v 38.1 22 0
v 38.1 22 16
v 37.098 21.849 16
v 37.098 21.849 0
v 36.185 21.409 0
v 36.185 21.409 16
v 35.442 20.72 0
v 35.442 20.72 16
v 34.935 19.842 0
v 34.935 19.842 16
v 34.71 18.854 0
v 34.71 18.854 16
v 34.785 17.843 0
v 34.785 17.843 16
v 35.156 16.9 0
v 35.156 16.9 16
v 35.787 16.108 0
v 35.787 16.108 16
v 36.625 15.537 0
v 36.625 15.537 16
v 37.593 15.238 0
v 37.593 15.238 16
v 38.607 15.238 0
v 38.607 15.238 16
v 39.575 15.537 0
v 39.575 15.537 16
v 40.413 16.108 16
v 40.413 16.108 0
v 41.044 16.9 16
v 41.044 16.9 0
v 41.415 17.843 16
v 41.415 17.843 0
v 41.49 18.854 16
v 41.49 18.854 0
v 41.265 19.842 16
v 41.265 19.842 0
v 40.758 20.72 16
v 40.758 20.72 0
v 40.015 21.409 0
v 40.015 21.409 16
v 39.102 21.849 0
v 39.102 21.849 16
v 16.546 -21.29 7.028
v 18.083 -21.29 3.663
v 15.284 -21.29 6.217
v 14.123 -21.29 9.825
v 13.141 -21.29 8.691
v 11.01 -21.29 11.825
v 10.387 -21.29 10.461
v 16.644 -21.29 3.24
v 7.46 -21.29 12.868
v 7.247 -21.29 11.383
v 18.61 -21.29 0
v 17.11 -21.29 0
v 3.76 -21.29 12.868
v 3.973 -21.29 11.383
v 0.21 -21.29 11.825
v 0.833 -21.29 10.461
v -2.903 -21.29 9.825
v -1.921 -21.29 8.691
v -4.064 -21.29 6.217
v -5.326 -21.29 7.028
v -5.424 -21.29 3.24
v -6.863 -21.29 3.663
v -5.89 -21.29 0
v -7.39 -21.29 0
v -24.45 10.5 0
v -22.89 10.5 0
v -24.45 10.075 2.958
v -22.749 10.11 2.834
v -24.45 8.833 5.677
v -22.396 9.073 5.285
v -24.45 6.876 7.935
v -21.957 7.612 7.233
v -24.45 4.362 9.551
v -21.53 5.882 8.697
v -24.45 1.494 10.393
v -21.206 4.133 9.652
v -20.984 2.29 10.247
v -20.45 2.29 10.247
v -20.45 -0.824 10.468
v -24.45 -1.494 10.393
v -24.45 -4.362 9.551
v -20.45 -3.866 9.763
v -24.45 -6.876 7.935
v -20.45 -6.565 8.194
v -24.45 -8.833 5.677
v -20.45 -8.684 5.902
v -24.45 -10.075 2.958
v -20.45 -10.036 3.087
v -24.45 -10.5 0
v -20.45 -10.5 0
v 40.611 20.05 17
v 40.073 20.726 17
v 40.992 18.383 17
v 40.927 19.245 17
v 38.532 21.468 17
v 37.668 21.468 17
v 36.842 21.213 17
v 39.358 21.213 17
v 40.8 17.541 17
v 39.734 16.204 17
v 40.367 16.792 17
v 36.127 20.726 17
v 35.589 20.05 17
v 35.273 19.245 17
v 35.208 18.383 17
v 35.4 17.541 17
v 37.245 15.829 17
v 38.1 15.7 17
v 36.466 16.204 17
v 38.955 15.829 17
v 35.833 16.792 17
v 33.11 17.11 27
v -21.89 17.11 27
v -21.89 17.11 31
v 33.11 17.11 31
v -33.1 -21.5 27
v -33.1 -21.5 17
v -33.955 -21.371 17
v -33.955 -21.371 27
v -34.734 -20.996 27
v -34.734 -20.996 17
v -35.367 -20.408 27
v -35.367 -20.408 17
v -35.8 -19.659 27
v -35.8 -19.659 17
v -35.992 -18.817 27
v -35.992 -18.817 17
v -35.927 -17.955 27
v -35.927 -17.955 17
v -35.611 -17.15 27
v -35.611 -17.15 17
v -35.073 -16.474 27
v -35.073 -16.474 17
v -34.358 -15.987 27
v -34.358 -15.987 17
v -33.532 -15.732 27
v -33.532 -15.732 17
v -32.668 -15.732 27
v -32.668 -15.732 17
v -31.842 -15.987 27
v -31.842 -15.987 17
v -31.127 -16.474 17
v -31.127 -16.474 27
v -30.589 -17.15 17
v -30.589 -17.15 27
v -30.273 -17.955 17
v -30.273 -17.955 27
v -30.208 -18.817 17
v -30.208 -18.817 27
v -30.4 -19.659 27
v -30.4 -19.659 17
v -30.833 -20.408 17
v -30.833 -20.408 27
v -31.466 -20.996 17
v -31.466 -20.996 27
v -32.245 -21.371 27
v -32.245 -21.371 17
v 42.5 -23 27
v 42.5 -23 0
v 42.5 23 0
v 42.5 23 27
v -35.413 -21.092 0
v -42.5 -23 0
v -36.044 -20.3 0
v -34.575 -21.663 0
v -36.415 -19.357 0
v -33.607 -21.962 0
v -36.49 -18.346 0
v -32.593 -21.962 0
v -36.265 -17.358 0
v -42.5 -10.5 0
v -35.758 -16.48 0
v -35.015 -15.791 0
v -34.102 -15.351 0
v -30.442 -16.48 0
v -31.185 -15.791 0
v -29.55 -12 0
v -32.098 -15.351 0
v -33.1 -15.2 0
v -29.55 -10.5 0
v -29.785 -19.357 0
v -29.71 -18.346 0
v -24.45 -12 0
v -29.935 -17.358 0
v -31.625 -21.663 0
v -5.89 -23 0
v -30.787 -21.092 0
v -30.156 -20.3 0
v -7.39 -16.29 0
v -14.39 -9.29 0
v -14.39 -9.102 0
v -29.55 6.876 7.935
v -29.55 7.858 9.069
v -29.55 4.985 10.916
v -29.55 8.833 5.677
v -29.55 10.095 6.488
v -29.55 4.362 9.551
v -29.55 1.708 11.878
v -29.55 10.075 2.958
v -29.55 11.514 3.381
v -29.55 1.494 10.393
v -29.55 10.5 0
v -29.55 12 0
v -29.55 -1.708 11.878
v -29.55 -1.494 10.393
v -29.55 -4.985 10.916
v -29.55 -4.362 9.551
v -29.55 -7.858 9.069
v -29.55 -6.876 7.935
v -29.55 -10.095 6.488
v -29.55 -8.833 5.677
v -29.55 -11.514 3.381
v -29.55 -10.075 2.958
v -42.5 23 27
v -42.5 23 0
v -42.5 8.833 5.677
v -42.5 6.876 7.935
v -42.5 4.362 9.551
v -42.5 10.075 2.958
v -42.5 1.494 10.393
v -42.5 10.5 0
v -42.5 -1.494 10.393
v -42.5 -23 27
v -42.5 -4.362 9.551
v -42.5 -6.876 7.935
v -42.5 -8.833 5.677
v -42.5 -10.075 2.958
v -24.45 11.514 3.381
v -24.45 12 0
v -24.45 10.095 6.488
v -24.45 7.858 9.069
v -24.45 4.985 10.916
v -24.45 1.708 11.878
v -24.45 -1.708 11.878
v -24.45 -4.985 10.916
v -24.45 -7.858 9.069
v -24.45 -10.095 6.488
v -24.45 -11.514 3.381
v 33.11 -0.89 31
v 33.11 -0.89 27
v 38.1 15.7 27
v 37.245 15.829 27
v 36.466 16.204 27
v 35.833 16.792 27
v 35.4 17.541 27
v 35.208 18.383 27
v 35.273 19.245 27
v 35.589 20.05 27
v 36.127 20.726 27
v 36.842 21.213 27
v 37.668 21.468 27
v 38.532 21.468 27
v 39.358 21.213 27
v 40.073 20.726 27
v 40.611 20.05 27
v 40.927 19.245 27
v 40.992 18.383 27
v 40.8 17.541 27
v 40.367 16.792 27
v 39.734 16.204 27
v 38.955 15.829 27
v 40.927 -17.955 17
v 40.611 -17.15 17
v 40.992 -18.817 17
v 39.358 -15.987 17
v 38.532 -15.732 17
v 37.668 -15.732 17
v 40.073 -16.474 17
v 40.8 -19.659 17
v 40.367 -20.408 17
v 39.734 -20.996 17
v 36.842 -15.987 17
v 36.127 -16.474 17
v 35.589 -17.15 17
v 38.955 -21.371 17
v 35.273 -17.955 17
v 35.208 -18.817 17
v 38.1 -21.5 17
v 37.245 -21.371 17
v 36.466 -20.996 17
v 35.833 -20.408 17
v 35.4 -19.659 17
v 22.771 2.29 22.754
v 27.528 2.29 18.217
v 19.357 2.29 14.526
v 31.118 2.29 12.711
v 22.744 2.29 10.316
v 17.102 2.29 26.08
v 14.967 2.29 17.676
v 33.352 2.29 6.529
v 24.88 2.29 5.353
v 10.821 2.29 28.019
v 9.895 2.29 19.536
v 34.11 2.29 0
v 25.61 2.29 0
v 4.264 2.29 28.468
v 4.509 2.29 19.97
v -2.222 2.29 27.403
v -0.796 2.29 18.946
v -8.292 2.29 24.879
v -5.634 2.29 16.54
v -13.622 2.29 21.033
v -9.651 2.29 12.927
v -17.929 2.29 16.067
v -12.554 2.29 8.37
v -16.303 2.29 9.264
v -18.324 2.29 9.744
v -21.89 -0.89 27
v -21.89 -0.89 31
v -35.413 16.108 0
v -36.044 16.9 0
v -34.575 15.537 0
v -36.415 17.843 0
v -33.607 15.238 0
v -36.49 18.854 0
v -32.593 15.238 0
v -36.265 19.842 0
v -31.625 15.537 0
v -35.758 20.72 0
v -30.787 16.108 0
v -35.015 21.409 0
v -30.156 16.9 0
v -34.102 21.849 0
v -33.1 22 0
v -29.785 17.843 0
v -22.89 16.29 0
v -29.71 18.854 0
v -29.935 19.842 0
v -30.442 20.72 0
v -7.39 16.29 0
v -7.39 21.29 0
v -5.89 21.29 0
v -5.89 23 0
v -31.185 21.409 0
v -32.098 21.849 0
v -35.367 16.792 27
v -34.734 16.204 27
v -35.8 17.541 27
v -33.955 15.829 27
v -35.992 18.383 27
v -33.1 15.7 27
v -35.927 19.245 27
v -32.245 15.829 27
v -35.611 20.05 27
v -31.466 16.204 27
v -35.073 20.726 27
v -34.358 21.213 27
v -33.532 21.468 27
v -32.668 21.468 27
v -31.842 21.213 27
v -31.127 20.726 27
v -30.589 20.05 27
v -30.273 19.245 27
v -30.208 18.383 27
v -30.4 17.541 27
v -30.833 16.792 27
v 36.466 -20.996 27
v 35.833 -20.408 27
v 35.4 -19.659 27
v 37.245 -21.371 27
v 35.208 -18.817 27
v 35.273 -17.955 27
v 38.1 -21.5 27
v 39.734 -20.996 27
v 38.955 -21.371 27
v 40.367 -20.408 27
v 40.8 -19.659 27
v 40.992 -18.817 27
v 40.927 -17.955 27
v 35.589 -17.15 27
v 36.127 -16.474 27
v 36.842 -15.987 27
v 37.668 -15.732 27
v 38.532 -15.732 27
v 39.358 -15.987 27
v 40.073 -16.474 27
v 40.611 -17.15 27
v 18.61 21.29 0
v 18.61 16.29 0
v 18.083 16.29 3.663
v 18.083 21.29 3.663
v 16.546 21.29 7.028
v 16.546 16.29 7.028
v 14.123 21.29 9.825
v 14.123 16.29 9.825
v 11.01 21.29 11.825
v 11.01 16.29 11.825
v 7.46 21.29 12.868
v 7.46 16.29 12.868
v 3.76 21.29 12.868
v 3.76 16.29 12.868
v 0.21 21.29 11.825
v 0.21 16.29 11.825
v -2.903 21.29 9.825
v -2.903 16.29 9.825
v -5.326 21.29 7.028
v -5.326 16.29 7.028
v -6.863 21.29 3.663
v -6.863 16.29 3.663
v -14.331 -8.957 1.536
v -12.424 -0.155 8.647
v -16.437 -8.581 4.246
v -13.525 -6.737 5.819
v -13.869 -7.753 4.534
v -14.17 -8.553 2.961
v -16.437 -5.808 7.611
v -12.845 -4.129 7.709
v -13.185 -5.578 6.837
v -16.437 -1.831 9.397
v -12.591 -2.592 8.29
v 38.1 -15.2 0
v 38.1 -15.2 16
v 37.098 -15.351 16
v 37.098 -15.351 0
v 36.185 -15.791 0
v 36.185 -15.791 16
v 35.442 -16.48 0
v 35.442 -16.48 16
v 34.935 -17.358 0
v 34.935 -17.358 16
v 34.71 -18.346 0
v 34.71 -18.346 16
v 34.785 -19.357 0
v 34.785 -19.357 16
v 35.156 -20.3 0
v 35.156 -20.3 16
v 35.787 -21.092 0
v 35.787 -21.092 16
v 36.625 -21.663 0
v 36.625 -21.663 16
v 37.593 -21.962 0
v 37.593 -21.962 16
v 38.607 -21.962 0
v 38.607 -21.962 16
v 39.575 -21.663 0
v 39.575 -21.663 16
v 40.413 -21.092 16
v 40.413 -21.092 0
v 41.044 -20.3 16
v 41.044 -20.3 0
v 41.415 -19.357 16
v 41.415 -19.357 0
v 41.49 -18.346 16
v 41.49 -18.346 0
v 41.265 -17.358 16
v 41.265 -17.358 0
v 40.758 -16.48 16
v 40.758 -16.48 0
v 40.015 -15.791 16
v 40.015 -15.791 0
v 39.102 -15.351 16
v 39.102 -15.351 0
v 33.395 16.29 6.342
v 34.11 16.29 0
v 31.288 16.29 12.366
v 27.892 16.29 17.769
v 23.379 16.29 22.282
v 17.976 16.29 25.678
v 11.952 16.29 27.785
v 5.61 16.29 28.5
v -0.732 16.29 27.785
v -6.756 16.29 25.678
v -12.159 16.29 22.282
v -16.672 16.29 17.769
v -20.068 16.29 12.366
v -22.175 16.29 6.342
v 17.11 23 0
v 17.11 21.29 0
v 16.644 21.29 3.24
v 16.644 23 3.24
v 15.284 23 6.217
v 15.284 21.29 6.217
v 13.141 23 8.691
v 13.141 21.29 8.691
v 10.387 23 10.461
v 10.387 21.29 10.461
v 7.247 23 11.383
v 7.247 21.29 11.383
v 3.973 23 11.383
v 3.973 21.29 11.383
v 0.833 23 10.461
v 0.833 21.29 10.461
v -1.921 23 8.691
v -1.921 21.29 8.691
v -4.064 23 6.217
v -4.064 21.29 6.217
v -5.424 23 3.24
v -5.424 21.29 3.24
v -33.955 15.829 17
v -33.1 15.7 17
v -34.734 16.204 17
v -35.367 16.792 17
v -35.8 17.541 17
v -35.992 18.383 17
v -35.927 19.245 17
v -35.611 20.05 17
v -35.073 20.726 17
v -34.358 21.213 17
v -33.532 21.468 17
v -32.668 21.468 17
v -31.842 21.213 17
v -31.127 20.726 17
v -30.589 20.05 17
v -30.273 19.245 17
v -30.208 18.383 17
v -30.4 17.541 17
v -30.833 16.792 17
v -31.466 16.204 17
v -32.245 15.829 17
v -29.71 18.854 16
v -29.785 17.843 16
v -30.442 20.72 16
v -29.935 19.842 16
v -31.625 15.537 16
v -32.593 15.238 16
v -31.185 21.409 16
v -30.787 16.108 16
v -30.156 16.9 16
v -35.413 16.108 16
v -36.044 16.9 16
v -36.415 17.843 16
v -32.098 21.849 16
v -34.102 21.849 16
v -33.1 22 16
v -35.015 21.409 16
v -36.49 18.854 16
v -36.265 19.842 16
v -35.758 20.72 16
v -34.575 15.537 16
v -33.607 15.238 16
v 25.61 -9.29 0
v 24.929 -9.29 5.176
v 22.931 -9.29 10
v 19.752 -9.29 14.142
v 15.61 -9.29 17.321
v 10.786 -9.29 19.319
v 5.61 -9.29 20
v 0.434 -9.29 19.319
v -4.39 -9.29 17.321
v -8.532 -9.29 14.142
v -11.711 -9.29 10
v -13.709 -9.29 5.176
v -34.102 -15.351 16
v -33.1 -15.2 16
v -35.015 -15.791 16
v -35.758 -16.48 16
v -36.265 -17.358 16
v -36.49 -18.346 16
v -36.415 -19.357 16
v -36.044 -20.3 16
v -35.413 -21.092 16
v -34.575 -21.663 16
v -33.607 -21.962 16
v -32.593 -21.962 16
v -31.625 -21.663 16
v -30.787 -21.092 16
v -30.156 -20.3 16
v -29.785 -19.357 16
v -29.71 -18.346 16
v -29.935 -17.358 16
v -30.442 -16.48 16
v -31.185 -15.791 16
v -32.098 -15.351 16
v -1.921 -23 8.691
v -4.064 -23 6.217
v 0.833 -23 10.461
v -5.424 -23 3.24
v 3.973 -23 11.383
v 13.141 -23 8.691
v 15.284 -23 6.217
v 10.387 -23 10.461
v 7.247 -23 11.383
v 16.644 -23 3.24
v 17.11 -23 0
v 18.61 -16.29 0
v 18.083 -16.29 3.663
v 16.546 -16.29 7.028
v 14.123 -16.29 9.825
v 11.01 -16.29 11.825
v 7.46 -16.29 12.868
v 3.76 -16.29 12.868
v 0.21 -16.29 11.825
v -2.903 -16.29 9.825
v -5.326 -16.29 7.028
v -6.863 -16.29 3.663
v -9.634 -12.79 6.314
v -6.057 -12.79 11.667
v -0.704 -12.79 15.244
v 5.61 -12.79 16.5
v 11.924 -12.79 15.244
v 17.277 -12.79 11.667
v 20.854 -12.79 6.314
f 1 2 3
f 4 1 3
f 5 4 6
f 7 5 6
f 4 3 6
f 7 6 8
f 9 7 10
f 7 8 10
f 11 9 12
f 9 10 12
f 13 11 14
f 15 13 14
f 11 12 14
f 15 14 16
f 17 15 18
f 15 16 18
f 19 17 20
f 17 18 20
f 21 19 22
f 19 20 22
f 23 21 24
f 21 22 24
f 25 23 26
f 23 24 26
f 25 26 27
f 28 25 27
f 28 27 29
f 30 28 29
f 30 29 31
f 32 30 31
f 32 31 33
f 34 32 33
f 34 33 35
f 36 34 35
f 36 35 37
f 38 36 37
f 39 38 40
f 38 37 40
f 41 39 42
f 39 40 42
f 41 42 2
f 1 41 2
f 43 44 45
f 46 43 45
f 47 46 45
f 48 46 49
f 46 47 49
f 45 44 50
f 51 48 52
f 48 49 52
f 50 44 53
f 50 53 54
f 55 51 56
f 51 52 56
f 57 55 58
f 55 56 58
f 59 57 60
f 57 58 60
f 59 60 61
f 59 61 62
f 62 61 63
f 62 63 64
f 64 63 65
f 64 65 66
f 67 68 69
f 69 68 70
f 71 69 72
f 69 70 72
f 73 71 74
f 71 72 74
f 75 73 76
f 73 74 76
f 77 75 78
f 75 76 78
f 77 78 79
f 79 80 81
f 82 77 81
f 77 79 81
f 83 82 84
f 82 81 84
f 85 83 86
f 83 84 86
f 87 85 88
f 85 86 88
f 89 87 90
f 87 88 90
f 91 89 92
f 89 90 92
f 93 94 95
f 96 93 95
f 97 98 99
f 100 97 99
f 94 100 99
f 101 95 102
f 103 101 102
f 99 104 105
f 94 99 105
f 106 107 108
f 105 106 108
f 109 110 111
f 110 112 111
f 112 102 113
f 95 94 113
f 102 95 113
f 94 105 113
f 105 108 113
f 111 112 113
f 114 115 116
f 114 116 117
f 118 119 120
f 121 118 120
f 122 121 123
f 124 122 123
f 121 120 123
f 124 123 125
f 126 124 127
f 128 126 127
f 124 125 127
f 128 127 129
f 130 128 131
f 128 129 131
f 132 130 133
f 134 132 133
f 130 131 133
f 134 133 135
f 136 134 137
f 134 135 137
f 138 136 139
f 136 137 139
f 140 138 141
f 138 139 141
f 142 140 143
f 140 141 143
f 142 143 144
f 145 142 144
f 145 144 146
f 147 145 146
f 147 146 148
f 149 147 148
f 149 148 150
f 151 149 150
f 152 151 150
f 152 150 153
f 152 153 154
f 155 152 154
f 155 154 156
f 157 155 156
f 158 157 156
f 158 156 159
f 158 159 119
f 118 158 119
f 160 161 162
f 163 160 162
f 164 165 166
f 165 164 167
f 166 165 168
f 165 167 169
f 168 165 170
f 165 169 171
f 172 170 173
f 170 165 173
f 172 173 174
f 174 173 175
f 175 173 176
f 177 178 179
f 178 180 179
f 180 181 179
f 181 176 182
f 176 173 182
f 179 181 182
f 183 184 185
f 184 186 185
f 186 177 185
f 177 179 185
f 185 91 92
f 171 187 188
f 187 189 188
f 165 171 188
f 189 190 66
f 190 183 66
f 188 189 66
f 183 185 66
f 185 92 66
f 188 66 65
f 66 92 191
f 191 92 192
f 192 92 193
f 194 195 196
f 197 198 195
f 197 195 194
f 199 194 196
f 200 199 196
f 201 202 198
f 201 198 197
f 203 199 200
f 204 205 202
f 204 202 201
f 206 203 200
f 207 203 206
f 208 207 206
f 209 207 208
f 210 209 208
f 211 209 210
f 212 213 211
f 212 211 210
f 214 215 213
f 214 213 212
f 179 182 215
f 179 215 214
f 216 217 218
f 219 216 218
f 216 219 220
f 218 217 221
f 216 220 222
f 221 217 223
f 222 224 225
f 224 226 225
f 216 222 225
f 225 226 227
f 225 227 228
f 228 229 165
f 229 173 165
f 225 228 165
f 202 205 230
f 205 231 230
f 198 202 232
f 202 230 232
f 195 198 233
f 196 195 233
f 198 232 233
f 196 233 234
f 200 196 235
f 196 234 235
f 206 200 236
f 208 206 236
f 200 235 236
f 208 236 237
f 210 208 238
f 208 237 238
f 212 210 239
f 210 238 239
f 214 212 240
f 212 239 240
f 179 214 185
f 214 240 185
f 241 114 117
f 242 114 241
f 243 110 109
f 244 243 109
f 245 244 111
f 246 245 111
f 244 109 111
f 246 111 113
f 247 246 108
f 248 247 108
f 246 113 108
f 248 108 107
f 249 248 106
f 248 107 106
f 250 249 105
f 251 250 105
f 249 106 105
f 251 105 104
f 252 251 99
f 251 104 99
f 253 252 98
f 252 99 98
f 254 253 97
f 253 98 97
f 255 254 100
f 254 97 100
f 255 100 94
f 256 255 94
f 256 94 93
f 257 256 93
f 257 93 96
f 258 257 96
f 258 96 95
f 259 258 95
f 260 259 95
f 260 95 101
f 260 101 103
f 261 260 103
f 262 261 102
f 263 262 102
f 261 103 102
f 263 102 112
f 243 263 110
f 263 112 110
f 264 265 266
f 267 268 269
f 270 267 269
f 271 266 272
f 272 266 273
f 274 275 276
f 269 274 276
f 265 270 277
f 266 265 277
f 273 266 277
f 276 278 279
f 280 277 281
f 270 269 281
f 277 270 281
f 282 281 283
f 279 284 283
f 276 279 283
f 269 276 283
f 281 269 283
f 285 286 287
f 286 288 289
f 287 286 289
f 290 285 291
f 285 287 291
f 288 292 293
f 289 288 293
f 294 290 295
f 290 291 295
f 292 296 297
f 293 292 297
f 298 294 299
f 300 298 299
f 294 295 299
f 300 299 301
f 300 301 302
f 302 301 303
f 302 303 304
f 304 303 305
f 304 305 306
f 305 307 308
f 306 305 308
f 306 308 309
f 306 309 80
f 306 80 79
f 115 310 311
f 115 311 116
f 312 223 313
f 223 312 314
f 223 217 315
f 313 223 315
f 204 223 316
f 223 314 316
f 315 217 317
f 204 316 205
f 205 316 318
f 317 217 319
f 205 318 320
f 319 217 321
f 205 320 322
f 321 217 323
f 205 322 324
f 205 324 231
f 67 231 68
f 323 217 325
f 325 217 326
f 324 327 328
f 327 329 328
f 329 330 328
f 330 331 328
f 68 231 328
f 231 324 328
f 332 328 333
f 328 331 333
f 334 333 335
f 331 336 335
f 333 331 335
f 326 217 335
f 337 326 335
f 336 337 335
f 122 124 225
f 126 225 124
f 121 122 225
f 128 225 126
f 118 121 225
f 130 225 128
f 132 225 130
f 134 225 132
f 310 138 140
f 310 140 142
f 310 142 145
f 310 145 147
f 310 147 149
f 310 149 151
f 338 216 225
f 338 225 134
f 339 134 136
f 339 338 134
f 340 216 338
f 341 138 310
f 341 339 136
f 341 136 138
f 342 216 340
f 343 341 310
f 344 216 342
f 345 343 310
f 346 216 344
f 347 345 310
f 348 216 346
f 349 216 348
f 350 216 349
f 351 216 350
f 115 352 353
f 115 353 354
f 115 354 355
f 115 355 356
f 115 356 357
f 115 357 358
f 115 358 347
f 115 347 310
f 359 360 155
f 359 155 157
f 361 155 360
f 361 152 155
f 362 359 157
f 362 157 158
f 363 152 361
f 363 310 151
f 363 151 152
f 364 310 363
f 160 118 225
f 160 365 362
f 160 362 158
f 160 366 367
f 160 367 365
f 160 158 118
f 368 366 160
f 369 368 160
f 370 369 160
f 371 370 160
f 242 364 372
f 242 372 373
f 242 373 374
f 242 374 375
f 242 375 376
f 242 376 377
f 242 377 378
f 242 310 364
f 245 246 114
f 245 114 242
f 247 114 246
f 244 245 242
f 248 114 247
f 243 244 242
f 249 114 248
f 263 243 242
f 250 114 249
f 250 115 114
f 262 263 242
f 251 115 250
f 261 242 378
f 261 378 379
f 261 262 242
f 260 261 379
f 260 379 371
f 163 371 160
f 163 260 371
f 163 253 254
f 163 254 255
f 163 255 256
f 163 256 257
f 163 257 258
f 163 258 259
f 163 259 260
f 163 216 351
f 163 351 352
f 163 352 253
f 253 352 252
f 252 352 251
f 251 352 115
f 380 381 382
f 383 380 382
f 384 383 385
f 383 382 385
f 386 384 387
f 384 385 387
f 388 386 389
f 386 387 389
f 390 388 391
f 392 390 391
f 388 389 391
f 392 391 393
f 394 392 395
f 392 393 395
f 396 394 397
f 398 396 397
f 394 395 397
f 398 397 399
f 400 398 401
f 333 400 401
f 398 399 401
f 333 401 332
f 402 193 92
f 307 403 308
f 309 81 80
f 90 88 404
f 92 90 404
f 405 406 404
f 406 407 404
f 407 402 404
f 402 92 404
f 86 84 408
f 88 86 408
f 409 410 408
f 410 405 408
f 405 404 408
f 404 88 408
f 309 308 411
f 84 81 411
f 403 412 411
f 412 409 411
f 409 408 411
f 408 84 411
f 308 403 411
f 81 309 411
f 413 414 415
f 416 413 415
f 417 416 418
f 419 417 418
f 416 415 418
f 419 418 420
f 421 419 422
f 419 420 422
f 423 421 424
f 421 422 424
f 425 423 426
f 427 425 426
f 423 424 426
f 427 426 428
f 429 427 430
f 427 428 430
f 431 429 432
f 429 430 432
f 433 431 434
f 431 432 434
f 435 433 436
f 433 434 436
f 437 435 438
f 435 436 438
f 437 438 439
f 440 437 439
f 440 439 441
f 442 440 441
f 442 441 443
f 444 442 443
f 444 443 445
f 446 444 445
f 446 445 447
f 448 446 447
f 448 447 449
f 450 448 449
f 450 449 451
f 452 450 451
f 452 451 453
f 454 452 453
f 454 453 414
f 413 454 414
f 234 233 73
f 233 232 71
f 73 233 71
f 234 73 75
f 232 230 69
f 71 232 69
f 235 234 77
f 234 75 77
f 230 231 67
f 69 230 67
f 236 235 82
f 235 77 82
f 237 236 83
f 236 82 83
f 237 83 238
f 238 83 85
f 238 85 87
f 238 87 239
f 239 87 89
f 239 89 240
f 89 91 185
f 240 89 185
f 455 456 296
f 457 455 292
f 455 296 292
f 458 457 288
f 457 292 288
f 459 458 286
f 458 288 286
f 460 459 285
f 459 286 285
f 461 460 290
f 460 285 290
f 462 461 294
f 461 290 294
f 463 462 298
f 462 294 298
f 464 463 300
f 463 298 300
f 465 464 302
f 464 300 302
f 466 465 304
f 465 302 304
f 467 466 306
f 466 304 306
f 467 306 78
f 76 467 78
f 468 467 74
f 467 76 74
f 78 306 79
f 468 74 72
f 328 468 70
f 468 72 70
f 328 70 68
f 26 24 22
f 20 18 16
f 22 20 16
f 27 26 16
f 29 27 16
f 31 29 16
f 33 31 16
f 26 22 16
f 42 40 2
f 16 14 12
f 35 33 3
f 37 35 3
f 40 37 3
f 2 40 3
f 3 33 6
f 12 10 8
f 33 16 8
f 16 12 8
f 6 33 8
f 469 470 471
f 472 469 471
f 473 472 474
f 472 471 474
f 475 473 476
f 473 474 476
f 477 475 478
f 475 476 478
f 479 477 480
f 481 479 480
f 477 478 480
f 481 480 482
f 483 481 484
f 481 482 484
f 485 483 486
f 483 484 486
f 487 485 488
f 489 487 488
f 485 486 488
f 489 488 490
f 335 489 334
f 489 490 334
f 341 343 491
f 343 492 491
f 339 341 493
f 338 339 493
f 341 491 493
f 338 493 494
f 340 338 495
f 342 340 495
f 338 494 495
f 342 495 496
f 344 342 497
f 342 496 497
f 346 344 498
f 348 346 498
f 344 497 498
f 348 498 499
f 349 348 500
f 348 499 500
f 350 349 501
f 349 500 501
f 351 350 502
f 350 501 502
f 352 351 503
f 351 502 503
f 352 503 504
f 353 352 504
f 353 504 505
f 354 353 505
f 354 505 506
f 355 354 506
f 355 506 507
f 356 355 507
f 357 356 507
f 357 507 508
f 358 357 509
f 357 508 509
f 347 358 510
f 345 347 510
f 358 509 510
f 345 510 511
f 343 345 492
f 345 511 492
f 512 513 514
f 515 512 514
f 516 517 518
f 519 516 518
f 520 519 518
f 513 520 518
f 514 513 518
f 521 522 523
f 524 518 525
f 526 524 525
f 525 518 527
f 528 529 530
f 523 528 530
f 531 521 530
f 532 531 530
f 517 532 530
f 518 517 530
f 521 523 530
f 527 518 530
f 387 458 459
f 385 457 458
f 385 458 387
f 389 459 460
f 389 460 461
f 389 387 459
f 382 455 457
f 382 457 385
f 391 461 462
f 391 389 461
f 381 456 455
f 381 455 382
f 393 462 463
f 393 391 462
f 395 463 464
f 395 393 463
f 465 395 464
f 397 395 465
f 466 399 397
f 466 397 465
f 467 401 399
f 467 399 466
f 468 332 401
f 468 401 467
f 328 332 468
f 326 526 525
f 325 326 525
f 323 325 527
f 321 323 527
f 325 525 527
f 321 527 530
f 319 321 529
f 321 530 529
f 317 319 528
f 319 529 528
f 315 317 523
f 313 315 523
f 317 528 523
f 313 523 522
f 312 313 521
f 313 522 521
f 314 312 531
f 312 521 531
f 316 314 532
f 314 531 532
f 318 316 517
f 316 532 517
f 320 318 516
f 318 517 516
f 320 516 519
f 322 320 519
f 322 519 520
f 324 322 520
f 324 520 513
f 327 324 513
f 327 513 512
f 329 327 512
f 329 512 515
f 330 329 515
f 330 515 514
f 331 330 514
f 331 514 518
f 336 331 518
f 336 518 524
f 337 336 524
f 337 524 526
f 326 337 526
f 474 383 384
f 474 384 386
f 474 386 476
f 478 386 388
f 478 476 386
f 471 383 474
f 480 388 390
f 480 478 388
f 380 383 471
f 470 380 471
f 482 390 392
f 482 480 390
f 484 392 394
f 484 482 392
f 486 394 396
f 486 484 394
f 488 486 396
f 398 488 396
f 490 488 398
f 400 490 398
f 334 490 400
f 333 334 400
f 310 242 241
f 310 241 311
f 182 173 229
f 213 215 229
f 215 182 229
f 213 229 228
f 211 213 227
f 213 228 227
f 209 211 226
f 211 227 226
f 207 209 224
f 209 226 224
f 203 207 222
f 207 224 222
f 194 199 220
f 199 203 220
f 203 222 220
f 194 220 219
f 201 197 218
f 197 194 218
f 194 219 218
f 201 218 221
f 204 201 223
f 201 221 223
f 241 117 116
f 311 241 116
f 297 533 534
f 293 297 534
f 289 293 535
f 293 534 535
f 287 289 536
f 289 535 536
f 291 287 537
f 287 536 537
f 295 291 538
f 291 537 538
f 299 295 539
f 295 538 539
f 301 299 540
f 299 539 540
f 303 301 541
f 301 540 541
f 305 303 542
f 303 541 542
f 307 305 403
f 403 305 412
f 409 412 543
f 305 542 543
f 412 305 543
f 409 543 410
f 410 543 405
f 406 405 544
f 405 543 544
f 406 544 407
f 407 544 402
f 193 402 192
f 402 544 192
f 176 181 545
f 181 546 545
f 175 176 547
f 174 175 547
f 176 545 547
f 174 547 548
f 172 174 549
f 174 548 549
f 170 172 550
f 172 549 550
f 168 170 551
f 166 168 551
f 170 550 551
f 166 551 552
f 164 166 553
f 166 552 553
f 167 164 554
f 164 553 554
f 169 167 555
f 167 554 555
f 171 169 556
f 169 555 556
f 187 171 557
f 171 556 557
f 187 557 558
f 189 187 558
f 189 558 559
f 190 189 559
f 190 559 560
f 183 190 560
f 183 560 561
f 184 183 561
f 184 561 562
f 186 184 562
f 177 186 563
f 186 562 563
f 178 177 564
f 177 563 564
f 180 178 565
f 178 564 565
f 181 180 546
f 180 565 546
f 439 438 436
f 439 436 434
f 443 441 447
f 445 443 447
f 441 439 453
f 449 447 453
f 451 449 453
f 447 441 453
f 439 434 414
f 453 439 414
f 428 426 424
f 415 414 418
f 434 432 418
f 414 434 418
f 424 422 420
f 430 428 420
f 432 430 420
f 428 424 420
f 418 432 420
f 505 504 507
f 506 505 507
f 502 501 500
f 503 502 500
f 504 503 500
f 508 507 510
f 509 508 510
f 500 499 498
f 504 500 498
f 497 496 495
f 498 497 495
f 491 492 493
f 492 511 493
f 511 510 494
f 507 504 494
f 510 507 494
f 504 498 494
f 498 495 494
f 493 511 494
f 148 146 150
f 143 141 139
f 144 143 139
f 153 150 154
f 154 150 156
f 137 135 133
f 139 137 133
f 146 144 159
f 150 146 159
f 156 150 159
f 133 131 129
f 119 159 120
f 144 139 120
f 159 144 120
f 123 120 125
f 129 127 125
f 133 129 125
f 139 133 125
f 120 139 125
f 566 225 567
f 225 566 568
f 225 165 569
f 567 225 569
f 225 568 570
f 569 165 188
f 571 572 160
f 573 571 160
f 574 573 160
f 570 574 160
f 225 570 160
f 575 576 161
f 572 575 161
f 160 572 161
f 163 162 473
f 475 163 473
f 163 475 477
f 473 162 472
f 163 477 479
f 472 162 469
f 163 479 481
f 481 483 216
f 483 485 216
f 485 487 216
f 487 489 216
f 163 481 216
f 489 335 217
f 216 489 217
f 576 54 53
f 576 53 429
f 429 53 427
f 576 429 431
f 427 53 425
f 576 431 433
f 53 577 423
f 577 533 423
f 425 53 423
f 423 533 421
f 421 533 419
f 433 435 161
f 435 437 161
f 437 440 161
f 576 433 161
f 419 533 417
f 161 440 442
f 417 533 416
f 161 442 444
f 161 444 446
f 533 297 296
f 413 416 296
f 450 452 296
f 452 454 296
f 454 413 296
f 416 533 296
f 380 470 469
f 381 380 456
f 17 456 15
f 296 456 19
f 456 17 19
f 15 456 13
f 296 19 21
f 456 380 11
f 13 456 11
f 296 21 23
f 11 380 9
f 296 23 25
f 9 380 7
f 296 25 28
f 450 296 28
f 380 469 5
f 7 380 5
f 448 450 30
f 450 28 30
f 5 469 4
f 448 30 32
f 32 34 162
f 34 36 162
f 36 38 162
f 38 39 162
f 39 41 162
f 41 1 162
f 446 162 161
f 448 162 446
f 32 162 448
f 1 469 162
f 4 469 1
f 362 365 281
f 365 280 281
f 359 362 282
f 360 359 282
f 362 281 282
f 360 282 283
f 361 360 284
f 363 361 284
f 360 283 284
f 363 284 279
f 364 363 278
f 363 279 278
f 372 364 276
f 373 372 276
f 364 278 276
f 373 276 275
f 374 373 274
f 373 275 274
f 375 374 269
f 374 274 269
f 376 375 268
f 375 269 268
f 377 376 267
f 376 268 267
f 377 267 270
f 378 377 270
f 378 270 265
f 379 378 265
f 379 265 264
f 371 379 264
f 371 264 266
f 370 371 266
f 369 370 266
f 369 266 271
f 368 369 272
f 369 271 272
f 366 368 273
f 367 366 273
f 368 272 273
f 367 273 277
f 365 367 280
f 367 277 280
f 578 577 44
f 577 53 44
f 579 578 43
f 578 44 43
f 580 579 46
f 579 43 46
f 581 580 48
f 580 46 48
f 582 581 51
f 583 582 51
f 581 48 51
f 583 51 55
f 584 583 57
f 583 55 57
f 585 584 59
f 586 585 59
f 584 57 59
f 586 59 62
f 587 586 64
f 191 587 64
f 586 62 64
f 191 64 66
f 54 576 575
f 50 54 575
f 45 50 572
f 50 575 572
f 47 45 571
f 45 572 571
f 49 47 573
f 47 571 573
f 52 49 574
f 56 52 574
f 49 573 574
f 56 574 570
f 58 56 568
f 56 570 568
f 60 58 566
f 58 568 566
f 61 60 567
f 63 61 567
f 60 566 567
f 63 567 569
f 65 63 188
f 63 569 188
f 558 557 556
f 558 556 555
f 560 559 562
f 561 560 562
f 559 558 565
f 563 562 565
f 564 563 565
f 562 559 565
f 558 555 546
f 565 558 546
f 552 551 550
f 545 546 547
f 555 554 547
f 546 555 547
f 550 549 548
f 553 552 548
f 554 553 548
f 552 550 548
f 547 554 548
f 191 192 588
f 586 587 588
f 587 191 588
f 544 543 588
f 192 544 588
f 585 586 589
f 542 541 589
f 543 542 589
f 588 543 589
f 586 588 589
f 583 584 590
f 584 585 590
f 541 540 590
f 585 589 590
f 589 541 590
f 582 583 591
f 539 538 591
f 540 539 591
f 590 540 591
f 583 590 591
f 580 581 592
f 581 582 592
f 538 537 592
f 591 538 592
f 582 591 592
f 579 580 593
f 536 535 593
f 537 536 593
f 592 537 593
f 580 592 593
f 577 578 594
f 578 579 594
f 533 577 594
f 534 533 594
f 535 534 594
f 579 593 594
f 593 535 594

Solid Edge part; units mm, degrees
sketch "Sketch1" plane through (0, 0, 0) normal (0, 0, 1) x (1, 0, 0)
  line L0 (-42.5, -23) -> (42.5, -23)
  line L1 (42.5, -23) -> (42.5, 23)
  line L2 (42.5, 23) -> (-42.5, 23)
  line L3 (-42.5, 23) -> (-42.5, -23)
  dimension "D1" = 85
  dimension "D2" = 46
extrude "Protrusion1" add sketch "Sketch1" along normal blind 27
sketch "Sketch2" plane through (0, 0, 27) normal (0, 0, 1) x (-1, 0, 0)
  line L0 (-33.11, 0.89) -> (21.89, 0.89)
  line L1 (21.89, 0.89) -> (21.89, -17.11)
  line L2 (21.89, -17.11) -> (-33.11, -17.11)
  line L3 (-33.11, -17.11) -> (-33.11, 0.89)
  dimension "D1" = 55
  dimension "D2" = 18
  dimension "D3" = 5.89
  dimension "D4" = 9.39
extrude "Extrusionsausprägung_2" add sketch "Sketch2" along normal blind 4
sketch "Sketch3" plane through (0, 0, 0) normal (0, 0, -1) x (1, 0, 0)
  line L0 (-5.89, 21.29) -> (-5.89, 23)
  line L1 (-7.39, 21.29) -> (-5.89, 21.29)
  line L2 (-7.39, 16.29) -> (-7.39, 21.29)
  line L3 (-14.39, 9.29) -> (-7.39, 16.29)
  line L4 (-14.39, -2.29) -> (-14.39, 9.29)
  line L5 (-22.89, -2.29) -> (-14.39, -2.29)
  line L6 (-22.89, -16.29) -> (-22.89, -2.29)
  line L7 (-7.39, -16.29) -> (-22.89, -16.29)
  line L8 (-7.39, -21.29) -> (-7.39, -16.29)
  line L9 (-5.89, -21.29) -> (-7.39, -21.29)
  line L10 (-5.89, -23) -> (-5.89, -21.29)
  line L11 (5.61, -23) -> (-5.89, -23)
  dimension "D1" = 36.89
  dimension "D2" = 1.71
  dimension "D3" = 5
  dimension "D4" = 1.71
  dimension "D5" = 5
  dimension "D6" = 14
revolve "RevolvedCutout1" cut sketch "Sketch3" angle 360 about axis through (5.61, 23, 0) along (0, -1, 0) material side at (-5.84, -22.145, 0)
sketch "Sketch4" plane through (-24.195, 0, 0) normal (0, 0, -1) x (0, -1, 0)
  line L0 (0, 5.355) -> (12, 5.355)
  line L1 (12, 5.355) -> (12, 0.255)
  line L2 (12, 0.255) -> (0, 0.255)
  dimension "D1" = 5.1
  dimension "D2" = 32.61
revolve "RevolvedCutout2" cut sketch "Sketch4" angle 360 about axis through (-42.5, 0, 0) along (1, 0, 0)
sketch "Sketch5" plane through (-24.195, 0, 0) normal (0, 0, -1) x (1, 0, 0)
  line L0 (-0.255, 0) -> (-0.255, 10.5)
  line L1 (-0.255, 10.5) -> (3.745, 10.5)
  line L2 (3.745, 10.5) -> (16.745, 7.5)
  line L3 (16.745, 7.5) -> (16.745, 0)
  line L4 (16.745, 0) -> (-0.255, 0)
  dimension "D1" = 4
  dimension "D2" = 13
revolve "RevolvedCutout3" cut sketch "Sketch5" angle 360 about axis through (-42.5, 0, 0) along (1, 0, 0)
sketch "Sketch6" plane through (-24.195, 0, 0) normal (0, 0, -1) x (1, 0, 0)
  line L0 (-18.305, 0) -> (-5.355, 0)
  line L1 (-5.355, 0) -> (-5.355, -10.5)
  line L2 (-5.355, -10.5) -> (-18.305, -10.5)
  line L3 (-18.305, -10.5) -> (-18.305, 0)
revolve "RevolvedCutout4" cut sketch "Sketch6" angle 360 about axis through (0, 0, 0) along (1, 0, 0)
hole "Bohrung_9" at (38.1, 18.6, 27) direction (0, 0, -1) diameter 5.8 depth 10
hole "Hole1" at (38.1, -18.6, 27) direction (0, 0, -1) diameter 5.8 depth 10
hole "Hole2" at (-33.1, -18.6, 27) direction (0, 0, -1) diameter 5.8 depth 10
hole "Hole3" at (-33.1, 18.6, 27) direction (0, 0, -1) diameter 5.8 depth 10
hole "Bohrung_1" at (38.1, -18.6, 0) direction (0, 0, 1) diameter 6.8 depth 16
hole "Hole4" at (38.1, 18.6, 0) direction (0, 0, 1) diameter 6.8 depth 16
hole "Hole5" at (-33.1, 18.6, 0) direction (0, 0, 1) diameter 6.8 depth 16
hole "Hole6" at (-33.1, -18.6, 0) direction (0, 0, 1) diameter 6.8 depth 16
properties material "Polykarbonat"
